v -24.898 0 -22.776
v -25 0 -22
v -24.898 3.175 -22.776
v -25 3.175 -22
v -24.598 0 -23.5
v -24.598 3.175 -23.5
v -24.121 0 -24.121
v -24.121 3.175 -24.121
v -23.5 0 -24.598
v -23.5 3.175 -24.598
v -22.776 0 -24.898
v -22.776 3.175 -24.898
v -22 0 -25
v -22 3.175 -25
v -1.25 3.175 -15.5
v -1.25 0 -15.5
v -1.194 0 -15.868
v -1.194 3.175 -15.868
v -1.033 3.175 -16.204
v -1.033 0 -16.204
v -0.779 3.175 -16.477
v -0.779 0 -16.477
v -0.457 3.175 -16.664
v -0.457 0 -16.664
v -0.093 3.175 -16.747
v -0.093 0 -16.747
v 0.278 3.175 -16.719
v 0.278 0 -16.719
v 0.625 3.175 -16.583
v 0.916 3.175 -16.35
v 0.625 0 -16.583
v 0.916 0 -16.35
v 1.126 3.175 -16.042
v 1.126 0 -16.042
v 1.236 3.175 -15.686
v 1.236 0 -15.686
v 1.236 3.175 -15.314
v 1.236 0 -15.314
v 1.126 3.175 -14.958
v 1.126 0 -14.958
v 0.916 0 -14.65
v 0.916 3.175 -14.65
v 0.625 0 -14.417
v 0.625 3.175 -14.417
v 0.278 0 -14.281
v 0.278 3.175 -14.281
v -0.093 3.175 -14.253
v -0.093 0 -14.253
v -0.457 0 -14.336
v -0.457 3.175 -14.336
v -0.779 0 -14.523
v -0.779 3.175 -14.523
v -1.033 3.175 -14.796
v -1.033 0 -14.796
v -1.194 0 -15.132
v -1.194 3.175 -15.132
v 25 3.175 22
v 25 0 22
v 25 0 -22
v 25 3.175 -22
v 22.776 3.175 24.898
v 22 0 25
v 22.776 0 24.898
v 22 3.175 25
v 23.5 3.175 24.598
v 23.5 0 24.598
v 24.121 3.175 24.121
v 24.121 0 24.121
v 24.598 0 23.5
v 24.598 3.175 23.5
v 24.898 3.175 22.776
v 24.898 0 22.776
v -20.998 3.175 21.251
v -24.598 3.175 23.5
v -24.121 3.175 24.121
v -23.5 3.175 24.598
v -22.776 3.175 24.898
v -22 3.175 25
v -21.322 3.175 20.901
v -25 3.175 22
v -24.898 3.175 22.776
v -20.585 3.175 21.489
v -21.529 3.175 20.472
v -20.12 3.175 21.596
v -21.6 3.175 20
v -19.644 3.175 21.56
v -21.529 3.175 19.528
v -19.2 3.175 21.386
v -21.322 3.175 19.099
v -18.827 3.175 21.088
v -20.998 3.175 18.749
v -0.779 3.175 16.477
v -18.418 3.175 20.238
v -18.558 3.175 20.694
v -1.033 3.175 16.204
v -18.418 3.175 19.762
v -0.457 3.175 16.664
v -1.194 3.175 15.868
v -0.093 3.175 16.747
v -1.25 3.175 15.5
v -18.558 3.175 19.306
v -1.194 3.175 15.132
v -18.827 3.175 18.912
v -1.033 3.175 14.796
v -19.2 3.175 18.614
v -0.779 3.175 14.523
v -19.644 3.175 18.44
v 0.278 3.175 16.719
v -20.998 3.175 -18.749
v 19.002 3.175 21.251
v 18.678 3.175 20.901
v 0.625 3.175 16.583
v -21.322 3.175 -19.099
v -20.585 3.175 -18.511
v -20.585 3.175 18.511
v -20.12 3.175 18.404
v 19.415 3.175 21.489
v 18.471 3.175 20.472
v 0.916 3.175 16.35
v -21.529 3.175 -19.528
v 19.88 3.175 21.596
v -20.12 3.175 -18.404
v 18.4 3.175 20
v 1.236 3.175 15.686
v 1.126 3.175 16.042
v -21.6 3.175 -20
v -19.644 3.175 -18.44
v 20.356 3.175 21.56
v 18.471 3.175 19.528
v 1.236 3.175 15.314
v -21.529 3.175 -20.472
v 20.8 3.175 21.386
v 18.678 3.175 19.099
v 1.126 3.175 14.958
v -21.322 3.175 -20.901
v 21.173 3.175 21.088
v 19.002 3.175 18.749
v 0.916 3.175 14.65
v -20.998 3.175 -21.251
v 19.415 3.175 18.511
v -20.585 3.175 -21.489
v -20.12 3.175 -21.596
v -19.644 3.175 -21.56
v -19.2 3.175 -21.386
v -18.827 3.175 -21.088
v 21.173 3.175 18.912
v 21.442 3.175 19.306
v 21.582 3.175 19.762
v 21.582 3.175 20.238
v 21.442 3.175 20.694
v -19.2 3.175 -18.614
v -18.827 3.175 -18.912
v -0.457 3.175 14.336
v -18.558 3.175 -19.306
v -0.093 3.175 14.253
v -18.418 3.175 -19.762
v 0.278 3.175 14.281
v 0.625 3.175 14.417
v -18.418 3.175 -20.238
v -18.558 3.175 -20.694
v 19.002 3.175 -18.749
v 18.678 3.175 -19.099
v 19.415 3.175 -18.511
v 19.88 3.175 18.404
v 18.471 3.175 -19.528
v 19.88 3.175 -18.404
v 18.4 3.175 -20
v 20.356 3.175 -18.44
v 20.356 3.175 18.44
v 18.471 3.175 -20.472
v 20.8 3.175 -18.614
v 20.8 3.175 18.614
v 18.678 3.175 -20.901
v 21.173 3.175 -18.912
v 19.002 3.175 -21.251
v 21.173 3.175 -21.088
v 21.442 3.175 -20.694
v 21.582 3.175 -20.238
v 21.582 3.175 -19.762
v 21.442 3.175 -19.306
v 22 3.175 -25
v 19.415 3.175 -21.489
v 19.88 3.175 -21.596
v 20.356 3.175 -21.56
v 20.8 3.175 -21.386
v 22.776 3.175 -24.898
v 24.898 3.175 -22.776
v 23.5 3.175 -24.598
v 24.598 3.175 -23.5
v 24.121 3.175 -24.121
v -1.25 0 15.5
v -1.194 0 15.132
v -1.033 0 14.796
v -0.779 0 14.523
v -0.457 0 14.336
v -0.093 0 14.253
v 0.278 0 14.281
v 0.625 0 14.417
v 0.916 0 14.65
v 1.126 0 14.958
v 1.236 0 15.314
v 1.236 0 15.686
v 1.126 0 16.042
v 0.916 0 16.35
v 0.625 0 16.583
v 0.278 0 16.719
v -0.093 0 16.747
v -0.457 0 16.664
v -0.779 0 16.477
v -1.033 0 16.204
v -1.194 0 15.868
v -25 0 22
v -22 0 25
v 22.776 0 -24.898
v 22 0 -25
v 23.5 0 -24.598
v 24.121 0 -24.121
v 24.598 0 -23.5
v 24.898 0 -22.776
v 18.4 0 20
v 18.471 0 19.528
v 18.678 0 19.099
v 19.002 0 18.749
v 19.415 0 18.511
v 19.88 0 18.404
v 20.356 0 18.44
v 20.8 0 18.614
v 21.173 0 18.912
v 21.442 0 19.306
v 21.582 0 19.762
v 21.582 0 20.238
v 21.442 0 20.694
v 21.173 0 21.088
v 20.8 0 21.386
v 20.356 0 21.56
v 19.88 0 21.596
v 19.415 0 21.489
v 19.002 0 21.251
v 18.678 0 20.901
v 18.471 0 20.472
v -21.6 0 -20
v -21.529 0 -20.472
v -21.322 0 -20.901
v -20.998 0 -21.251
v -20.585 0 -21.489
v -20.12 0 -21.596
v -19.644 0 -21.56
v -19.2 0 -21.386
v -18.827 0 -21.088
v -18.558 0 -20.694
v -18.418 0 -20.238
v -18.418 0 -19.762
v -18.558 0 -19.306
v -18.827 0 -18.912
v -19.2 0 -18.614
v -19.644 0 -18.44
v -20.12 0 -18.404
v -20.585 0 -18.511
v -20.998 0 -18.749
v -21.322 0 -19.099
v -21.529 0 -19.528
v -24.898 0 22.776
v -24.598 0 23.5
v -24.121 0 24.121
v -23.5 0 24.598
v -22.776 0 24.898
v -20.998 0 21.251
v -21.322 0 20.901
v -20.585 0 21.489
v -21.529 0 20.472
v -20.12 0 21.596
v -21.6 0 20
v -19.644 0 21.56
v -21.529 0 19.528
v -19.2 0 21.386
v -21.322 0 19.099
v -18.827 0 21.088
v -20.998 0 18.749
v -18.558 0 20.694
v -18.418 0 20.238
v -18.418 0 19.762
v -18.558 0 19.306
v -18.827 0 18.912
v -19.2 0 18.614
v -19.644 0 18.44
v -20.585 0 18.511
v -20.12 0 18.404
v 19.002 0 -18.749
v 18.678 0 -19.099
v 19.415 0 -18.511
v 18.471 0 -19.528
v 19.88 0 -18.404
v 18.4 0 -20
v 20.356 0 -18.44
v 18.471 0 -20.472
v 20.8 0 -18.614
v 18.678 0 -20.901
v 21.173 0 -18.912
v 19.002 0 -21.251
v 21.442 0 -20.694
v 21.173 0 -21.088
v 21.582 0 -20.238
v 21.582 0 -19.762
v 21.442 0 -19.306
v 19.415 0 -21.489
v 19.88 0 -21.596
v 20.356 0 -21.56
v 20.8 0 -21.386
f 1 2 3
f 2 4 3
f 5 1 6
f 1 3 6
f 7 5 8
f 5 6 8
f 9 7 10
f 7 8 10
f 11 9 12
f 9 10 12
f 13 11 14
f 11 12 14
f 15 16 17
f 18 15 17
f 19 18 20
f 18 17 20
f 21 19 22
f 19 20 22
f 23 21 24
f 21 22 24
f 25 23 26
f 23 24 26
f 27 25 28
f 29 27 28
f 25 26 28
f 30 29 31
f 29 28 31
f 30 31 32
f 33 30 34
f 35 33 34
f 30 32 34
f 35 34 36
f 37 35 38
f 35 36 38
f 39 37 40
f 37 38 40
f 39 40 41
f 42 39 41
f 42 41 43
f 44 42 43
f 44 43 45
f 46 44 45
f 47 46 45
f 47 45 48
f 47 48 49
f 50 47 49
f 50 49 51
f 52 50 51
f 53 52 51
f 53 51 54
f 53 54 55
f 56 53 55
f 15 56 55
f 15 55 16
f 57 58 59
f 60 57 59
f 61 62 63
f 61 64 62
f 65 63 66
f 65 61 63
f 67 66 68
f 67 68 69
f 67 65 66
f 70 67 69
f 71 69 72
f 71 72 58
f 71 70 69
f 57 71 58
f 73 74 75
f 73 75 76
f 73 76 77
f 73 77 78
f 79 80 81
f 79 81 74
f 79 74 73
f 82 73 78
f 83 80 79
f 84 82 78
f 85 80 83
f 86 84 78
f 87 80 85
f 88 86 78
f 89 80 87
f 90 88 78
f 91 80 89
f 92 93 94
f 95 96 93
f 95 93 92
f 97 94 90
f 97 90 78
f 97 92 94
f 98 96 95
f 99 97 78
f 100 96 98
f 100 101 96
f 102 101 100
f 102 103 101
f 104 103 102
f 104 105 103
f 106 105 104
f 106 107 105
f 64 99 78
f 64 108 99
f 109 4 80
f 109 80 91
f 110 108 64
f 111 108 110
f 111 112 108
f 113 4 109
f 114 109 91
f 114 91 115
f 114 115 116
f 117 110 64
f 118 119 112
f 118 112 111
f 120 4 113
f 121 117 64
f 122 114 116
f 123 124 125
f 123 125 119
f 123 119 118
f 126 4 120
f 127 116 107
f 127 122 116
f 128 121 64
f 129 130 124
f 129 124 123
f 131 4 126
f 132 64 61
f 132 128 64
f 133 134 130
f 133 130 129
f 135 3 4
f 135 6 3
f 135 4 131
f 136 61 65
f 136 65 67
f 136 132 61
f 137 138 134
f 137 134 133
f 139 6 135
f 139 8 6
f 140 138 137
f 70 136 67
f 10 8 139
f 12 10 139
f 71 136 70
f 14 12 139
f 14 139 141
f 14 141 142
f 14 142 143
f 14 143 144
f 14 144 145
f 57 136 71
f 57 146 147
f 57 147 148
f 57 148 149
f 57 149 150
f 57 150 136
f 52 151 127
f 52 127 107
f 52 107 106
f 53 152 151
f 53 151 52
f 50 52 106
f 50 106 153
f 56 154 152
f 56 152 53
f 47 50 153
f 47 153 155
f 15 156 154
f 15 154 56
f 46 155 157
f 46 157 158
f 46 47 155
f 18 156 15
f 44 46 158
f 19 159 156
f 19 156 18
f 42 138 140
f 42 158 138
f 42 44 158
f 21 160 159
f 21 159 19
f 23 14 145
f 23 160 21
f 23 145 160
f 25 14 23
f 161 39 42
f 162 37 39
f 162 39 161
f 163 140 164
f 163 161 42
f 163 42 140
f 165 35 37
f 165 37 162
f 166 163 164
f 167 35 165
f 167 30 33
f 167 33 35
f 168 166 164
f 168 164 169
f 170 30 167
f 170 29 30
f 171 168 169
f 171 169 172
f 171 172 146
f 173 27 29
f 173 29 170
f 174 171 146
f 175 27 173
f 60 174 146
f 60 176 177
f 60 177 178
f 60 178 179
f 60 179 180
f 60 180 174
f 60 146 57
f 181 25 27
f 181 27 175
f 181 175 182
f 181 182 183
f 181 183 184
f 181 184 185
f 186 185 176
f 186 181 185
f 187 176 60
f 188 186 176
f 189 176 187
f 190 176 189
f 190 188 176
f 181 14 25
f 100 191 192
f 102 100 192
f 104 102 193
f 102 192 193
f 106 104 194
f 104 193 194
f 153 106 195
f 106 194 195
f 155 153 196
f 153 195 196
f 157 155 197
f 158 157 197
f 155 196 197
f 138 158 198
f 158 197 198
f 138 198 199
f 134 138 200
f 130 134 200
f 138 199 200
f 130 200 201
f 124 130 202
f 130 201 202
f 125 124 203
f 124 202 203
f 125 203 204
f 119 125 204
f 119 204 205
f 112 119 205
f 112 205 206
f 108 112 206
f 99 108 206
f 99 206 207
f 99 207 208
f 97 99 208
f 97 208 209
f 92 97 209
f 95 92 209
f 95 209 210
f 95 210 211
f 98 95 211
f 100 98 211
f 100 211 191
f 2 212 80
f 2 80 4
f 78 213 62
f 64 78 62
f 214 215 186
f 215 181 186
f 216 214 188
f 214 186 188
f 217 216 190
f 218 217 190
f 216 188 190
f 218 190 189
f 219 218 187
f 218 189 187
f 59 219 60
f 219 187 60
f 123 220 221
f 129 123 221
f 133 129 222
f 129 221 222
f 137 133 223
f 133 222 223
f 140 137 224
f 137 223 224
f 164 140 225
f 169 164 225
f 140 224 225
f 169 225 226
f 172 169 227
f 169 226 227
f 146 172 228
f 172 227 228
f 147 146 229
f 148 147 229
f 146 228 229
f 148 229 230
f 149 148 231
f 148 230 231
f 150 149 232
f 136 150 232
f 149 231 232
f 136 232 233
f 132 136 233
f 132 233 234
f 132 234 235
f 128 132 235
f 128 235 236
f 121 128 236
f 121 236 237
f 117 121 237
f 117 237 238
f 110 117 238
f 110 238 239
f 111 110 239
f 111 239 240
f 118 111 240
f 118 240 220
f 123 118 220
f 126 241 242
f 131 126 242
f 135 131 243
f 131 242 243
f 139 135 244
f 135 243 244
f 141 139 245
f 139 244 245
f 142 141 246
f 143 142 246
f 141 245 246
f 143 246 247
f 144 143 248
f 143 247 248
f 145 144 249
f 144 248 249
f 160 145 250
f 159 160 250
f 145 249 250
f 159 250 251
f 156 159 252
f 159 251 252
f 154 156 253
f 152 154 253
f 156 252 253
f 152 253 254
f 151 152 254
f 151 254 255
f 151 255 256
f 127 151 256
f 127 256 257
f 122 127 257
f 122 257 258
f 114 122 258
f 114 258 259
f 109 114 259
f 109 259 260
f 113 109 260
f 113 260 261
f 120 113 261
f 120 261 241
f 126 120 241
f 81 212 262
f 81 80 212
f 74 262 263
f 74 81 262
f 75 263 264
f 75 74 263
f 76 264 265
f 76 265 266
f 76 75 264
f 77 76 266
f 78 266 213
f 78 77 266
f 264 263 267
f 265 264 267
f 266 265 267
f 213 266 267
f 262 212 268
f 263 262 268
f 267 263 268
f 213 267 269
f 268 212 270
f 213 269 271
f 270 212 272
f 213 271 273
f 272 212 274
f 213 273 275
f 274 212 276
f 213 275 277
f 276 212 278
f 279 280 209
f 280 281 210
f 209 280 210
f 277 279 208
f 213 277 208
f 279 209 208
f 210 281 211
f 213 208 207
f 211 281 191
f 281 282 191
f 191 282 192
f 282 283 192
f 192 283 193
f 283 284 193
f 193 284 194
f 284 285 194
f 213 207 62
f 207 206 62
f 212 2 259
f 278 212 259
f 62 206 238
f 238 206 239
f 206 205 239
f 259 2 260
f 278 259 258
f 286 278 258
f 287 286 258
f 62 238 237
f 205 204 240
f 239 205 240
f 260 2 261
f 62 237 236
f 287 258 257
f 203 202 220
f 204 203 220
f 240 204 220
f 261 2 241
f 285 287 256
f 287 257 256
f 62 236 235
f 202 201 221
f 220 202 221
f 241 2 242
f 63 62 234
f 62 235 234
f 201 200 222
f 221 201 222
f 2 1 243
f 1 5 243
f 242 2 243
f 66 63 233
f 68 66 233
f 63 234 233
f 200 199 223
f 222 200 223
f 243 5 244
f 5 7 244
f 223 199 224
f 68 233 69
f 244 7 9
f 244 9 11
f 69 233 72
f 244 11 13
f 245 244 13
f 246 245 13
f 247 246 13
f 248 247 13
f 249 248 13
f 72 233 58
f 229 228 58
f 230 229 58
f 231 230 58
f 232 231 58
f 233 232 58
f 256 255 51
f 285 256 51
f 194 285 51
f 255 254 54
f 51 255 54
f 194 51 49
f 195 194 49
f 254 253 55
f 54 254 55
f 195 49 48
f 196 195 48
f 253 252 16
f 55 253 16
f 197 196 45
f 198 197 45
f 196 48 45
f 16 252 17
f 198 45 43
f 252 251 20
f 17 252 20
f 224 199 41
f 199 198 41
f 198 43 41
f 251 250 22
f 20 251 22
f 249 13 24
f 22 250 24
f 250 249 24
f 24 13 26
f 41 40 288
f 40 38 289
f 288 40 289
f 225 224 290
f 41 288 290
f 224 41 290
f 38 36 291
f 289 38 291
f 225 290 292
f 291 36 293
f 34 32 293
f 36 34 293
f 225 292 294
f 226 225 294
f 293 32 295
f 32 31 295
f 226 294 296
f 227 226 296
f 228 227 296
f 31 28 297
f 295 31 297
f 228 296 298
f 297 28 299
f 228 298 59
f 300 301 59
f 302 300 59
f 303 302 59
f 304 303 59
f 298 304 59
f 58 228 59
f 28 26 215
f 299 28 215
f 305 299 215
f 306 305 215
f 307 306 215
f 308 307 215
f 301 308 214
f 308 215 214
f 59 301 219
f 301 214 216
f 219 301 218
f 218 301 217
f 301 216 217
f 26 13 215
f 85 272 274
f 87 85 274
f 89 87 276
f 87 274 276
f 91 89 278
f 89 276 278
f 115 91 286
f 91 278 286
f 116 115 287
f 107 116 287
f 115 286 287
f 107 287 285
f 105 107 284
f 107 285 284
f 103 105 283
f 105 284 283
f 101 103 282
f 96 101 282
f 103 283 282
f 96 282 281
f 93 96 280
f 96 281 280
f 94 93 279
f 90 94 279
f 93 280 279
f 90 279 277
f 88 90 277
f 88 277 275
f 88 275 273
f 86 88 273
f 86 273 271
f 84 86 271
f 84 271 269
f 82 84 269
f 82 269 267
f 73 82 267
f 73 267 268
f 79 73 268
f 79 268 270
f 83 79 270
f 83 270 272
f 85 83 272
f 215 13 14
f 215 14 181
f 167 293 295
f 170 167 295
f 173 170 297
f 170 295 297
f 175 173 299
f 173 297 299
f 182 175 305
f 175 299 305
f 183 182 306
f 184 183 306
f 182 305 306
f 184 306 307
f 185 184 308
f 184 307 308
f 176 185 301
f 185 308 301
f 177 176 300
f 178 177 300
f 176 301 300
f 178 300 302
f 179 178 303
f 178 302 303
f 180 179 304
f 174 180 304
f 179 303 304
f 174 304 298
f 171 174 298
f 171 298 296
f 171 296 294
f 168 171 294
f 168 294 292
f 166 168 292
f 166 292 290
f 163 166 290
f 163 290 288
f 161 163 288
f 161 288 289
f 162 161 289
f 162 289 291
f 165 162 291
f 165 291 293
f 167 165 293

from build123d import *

# Parameters (mm, degrees)
SKETCH1_W                = 50
SKETCH1_H                = 50
BOSS_EXTRUDE1_DEPTH      = 3.175
M3_CLEARANCE_HOLE1_D     = 3.2
M3_CLEARANCE_HOLE1_DEPTH = 12.4
M3_CLEARANCE_HOLE1_TIP   = 0.96137699
M3X0_5_TAPPED_HOLE1_D    = 2.5
FILLET1_R                = 3


with BuildPart() as part:
    # Sketch1 → Boss-Extrude1 (new body)
    with BuildSketch(Plane(origin=(0, 0, 0), x_dir=(1, 0, 0), z_dir=(0, 1, 0))):
        Rectangle(SKETCH1_W, SKETCH1_H)
    extrude(amount=BOSS_EXTRUDE1_DEPTH)

    # M3 Clearance Hole1
    with Locations(Plane(origin=(0, 3.175, 0), x_dir=(1, 0, 0), z_dir=(0, 1, 0))):
        with Locations((-20, 20), (20, 20), (-20, -20), (20, -20)):
            Hole(M3_CLEARANCE_HOLE1_D / 2, depth=M3_CLEARANCE_HOLE1_DEPTH)
            with Locations((0, 0, -(M3_CLEARANCE_HOLE1_DEPTH + M3_CLEARANCE_HOLE1_TIP / 2))):  # 118° drill point
                Cone(0, M3_CLEARANCE_HOLE1_D / 2, M3_CLEARANCE_HOLE1_TIP, mode=Mode.SUBTRACT)

    # M3x0.5 Tapped Hole1 (through all)
    with Locations(Plane(origin=(0, 3.175, 0), x_dir=(1, 0, 0), z_dir=(0, 1, 0))):
        with Locations((0, 15.5), (0, -15.5)):
            Hole(M3X0_5_TAPPED_HOLE1_D / 2)

    # Fillet1
    fillet1_edges = [part.edges().sort_by_distance(p)[0] for p in [
        (25, 1.5875, 25),
        (-25, 1.5875, 25),
        (-25, 1.5875, -25),
        (25, 1.5875, -25),
    ]]
    fillet(fillet1_edges, radius=FILLET1_R)


solid = part.part
